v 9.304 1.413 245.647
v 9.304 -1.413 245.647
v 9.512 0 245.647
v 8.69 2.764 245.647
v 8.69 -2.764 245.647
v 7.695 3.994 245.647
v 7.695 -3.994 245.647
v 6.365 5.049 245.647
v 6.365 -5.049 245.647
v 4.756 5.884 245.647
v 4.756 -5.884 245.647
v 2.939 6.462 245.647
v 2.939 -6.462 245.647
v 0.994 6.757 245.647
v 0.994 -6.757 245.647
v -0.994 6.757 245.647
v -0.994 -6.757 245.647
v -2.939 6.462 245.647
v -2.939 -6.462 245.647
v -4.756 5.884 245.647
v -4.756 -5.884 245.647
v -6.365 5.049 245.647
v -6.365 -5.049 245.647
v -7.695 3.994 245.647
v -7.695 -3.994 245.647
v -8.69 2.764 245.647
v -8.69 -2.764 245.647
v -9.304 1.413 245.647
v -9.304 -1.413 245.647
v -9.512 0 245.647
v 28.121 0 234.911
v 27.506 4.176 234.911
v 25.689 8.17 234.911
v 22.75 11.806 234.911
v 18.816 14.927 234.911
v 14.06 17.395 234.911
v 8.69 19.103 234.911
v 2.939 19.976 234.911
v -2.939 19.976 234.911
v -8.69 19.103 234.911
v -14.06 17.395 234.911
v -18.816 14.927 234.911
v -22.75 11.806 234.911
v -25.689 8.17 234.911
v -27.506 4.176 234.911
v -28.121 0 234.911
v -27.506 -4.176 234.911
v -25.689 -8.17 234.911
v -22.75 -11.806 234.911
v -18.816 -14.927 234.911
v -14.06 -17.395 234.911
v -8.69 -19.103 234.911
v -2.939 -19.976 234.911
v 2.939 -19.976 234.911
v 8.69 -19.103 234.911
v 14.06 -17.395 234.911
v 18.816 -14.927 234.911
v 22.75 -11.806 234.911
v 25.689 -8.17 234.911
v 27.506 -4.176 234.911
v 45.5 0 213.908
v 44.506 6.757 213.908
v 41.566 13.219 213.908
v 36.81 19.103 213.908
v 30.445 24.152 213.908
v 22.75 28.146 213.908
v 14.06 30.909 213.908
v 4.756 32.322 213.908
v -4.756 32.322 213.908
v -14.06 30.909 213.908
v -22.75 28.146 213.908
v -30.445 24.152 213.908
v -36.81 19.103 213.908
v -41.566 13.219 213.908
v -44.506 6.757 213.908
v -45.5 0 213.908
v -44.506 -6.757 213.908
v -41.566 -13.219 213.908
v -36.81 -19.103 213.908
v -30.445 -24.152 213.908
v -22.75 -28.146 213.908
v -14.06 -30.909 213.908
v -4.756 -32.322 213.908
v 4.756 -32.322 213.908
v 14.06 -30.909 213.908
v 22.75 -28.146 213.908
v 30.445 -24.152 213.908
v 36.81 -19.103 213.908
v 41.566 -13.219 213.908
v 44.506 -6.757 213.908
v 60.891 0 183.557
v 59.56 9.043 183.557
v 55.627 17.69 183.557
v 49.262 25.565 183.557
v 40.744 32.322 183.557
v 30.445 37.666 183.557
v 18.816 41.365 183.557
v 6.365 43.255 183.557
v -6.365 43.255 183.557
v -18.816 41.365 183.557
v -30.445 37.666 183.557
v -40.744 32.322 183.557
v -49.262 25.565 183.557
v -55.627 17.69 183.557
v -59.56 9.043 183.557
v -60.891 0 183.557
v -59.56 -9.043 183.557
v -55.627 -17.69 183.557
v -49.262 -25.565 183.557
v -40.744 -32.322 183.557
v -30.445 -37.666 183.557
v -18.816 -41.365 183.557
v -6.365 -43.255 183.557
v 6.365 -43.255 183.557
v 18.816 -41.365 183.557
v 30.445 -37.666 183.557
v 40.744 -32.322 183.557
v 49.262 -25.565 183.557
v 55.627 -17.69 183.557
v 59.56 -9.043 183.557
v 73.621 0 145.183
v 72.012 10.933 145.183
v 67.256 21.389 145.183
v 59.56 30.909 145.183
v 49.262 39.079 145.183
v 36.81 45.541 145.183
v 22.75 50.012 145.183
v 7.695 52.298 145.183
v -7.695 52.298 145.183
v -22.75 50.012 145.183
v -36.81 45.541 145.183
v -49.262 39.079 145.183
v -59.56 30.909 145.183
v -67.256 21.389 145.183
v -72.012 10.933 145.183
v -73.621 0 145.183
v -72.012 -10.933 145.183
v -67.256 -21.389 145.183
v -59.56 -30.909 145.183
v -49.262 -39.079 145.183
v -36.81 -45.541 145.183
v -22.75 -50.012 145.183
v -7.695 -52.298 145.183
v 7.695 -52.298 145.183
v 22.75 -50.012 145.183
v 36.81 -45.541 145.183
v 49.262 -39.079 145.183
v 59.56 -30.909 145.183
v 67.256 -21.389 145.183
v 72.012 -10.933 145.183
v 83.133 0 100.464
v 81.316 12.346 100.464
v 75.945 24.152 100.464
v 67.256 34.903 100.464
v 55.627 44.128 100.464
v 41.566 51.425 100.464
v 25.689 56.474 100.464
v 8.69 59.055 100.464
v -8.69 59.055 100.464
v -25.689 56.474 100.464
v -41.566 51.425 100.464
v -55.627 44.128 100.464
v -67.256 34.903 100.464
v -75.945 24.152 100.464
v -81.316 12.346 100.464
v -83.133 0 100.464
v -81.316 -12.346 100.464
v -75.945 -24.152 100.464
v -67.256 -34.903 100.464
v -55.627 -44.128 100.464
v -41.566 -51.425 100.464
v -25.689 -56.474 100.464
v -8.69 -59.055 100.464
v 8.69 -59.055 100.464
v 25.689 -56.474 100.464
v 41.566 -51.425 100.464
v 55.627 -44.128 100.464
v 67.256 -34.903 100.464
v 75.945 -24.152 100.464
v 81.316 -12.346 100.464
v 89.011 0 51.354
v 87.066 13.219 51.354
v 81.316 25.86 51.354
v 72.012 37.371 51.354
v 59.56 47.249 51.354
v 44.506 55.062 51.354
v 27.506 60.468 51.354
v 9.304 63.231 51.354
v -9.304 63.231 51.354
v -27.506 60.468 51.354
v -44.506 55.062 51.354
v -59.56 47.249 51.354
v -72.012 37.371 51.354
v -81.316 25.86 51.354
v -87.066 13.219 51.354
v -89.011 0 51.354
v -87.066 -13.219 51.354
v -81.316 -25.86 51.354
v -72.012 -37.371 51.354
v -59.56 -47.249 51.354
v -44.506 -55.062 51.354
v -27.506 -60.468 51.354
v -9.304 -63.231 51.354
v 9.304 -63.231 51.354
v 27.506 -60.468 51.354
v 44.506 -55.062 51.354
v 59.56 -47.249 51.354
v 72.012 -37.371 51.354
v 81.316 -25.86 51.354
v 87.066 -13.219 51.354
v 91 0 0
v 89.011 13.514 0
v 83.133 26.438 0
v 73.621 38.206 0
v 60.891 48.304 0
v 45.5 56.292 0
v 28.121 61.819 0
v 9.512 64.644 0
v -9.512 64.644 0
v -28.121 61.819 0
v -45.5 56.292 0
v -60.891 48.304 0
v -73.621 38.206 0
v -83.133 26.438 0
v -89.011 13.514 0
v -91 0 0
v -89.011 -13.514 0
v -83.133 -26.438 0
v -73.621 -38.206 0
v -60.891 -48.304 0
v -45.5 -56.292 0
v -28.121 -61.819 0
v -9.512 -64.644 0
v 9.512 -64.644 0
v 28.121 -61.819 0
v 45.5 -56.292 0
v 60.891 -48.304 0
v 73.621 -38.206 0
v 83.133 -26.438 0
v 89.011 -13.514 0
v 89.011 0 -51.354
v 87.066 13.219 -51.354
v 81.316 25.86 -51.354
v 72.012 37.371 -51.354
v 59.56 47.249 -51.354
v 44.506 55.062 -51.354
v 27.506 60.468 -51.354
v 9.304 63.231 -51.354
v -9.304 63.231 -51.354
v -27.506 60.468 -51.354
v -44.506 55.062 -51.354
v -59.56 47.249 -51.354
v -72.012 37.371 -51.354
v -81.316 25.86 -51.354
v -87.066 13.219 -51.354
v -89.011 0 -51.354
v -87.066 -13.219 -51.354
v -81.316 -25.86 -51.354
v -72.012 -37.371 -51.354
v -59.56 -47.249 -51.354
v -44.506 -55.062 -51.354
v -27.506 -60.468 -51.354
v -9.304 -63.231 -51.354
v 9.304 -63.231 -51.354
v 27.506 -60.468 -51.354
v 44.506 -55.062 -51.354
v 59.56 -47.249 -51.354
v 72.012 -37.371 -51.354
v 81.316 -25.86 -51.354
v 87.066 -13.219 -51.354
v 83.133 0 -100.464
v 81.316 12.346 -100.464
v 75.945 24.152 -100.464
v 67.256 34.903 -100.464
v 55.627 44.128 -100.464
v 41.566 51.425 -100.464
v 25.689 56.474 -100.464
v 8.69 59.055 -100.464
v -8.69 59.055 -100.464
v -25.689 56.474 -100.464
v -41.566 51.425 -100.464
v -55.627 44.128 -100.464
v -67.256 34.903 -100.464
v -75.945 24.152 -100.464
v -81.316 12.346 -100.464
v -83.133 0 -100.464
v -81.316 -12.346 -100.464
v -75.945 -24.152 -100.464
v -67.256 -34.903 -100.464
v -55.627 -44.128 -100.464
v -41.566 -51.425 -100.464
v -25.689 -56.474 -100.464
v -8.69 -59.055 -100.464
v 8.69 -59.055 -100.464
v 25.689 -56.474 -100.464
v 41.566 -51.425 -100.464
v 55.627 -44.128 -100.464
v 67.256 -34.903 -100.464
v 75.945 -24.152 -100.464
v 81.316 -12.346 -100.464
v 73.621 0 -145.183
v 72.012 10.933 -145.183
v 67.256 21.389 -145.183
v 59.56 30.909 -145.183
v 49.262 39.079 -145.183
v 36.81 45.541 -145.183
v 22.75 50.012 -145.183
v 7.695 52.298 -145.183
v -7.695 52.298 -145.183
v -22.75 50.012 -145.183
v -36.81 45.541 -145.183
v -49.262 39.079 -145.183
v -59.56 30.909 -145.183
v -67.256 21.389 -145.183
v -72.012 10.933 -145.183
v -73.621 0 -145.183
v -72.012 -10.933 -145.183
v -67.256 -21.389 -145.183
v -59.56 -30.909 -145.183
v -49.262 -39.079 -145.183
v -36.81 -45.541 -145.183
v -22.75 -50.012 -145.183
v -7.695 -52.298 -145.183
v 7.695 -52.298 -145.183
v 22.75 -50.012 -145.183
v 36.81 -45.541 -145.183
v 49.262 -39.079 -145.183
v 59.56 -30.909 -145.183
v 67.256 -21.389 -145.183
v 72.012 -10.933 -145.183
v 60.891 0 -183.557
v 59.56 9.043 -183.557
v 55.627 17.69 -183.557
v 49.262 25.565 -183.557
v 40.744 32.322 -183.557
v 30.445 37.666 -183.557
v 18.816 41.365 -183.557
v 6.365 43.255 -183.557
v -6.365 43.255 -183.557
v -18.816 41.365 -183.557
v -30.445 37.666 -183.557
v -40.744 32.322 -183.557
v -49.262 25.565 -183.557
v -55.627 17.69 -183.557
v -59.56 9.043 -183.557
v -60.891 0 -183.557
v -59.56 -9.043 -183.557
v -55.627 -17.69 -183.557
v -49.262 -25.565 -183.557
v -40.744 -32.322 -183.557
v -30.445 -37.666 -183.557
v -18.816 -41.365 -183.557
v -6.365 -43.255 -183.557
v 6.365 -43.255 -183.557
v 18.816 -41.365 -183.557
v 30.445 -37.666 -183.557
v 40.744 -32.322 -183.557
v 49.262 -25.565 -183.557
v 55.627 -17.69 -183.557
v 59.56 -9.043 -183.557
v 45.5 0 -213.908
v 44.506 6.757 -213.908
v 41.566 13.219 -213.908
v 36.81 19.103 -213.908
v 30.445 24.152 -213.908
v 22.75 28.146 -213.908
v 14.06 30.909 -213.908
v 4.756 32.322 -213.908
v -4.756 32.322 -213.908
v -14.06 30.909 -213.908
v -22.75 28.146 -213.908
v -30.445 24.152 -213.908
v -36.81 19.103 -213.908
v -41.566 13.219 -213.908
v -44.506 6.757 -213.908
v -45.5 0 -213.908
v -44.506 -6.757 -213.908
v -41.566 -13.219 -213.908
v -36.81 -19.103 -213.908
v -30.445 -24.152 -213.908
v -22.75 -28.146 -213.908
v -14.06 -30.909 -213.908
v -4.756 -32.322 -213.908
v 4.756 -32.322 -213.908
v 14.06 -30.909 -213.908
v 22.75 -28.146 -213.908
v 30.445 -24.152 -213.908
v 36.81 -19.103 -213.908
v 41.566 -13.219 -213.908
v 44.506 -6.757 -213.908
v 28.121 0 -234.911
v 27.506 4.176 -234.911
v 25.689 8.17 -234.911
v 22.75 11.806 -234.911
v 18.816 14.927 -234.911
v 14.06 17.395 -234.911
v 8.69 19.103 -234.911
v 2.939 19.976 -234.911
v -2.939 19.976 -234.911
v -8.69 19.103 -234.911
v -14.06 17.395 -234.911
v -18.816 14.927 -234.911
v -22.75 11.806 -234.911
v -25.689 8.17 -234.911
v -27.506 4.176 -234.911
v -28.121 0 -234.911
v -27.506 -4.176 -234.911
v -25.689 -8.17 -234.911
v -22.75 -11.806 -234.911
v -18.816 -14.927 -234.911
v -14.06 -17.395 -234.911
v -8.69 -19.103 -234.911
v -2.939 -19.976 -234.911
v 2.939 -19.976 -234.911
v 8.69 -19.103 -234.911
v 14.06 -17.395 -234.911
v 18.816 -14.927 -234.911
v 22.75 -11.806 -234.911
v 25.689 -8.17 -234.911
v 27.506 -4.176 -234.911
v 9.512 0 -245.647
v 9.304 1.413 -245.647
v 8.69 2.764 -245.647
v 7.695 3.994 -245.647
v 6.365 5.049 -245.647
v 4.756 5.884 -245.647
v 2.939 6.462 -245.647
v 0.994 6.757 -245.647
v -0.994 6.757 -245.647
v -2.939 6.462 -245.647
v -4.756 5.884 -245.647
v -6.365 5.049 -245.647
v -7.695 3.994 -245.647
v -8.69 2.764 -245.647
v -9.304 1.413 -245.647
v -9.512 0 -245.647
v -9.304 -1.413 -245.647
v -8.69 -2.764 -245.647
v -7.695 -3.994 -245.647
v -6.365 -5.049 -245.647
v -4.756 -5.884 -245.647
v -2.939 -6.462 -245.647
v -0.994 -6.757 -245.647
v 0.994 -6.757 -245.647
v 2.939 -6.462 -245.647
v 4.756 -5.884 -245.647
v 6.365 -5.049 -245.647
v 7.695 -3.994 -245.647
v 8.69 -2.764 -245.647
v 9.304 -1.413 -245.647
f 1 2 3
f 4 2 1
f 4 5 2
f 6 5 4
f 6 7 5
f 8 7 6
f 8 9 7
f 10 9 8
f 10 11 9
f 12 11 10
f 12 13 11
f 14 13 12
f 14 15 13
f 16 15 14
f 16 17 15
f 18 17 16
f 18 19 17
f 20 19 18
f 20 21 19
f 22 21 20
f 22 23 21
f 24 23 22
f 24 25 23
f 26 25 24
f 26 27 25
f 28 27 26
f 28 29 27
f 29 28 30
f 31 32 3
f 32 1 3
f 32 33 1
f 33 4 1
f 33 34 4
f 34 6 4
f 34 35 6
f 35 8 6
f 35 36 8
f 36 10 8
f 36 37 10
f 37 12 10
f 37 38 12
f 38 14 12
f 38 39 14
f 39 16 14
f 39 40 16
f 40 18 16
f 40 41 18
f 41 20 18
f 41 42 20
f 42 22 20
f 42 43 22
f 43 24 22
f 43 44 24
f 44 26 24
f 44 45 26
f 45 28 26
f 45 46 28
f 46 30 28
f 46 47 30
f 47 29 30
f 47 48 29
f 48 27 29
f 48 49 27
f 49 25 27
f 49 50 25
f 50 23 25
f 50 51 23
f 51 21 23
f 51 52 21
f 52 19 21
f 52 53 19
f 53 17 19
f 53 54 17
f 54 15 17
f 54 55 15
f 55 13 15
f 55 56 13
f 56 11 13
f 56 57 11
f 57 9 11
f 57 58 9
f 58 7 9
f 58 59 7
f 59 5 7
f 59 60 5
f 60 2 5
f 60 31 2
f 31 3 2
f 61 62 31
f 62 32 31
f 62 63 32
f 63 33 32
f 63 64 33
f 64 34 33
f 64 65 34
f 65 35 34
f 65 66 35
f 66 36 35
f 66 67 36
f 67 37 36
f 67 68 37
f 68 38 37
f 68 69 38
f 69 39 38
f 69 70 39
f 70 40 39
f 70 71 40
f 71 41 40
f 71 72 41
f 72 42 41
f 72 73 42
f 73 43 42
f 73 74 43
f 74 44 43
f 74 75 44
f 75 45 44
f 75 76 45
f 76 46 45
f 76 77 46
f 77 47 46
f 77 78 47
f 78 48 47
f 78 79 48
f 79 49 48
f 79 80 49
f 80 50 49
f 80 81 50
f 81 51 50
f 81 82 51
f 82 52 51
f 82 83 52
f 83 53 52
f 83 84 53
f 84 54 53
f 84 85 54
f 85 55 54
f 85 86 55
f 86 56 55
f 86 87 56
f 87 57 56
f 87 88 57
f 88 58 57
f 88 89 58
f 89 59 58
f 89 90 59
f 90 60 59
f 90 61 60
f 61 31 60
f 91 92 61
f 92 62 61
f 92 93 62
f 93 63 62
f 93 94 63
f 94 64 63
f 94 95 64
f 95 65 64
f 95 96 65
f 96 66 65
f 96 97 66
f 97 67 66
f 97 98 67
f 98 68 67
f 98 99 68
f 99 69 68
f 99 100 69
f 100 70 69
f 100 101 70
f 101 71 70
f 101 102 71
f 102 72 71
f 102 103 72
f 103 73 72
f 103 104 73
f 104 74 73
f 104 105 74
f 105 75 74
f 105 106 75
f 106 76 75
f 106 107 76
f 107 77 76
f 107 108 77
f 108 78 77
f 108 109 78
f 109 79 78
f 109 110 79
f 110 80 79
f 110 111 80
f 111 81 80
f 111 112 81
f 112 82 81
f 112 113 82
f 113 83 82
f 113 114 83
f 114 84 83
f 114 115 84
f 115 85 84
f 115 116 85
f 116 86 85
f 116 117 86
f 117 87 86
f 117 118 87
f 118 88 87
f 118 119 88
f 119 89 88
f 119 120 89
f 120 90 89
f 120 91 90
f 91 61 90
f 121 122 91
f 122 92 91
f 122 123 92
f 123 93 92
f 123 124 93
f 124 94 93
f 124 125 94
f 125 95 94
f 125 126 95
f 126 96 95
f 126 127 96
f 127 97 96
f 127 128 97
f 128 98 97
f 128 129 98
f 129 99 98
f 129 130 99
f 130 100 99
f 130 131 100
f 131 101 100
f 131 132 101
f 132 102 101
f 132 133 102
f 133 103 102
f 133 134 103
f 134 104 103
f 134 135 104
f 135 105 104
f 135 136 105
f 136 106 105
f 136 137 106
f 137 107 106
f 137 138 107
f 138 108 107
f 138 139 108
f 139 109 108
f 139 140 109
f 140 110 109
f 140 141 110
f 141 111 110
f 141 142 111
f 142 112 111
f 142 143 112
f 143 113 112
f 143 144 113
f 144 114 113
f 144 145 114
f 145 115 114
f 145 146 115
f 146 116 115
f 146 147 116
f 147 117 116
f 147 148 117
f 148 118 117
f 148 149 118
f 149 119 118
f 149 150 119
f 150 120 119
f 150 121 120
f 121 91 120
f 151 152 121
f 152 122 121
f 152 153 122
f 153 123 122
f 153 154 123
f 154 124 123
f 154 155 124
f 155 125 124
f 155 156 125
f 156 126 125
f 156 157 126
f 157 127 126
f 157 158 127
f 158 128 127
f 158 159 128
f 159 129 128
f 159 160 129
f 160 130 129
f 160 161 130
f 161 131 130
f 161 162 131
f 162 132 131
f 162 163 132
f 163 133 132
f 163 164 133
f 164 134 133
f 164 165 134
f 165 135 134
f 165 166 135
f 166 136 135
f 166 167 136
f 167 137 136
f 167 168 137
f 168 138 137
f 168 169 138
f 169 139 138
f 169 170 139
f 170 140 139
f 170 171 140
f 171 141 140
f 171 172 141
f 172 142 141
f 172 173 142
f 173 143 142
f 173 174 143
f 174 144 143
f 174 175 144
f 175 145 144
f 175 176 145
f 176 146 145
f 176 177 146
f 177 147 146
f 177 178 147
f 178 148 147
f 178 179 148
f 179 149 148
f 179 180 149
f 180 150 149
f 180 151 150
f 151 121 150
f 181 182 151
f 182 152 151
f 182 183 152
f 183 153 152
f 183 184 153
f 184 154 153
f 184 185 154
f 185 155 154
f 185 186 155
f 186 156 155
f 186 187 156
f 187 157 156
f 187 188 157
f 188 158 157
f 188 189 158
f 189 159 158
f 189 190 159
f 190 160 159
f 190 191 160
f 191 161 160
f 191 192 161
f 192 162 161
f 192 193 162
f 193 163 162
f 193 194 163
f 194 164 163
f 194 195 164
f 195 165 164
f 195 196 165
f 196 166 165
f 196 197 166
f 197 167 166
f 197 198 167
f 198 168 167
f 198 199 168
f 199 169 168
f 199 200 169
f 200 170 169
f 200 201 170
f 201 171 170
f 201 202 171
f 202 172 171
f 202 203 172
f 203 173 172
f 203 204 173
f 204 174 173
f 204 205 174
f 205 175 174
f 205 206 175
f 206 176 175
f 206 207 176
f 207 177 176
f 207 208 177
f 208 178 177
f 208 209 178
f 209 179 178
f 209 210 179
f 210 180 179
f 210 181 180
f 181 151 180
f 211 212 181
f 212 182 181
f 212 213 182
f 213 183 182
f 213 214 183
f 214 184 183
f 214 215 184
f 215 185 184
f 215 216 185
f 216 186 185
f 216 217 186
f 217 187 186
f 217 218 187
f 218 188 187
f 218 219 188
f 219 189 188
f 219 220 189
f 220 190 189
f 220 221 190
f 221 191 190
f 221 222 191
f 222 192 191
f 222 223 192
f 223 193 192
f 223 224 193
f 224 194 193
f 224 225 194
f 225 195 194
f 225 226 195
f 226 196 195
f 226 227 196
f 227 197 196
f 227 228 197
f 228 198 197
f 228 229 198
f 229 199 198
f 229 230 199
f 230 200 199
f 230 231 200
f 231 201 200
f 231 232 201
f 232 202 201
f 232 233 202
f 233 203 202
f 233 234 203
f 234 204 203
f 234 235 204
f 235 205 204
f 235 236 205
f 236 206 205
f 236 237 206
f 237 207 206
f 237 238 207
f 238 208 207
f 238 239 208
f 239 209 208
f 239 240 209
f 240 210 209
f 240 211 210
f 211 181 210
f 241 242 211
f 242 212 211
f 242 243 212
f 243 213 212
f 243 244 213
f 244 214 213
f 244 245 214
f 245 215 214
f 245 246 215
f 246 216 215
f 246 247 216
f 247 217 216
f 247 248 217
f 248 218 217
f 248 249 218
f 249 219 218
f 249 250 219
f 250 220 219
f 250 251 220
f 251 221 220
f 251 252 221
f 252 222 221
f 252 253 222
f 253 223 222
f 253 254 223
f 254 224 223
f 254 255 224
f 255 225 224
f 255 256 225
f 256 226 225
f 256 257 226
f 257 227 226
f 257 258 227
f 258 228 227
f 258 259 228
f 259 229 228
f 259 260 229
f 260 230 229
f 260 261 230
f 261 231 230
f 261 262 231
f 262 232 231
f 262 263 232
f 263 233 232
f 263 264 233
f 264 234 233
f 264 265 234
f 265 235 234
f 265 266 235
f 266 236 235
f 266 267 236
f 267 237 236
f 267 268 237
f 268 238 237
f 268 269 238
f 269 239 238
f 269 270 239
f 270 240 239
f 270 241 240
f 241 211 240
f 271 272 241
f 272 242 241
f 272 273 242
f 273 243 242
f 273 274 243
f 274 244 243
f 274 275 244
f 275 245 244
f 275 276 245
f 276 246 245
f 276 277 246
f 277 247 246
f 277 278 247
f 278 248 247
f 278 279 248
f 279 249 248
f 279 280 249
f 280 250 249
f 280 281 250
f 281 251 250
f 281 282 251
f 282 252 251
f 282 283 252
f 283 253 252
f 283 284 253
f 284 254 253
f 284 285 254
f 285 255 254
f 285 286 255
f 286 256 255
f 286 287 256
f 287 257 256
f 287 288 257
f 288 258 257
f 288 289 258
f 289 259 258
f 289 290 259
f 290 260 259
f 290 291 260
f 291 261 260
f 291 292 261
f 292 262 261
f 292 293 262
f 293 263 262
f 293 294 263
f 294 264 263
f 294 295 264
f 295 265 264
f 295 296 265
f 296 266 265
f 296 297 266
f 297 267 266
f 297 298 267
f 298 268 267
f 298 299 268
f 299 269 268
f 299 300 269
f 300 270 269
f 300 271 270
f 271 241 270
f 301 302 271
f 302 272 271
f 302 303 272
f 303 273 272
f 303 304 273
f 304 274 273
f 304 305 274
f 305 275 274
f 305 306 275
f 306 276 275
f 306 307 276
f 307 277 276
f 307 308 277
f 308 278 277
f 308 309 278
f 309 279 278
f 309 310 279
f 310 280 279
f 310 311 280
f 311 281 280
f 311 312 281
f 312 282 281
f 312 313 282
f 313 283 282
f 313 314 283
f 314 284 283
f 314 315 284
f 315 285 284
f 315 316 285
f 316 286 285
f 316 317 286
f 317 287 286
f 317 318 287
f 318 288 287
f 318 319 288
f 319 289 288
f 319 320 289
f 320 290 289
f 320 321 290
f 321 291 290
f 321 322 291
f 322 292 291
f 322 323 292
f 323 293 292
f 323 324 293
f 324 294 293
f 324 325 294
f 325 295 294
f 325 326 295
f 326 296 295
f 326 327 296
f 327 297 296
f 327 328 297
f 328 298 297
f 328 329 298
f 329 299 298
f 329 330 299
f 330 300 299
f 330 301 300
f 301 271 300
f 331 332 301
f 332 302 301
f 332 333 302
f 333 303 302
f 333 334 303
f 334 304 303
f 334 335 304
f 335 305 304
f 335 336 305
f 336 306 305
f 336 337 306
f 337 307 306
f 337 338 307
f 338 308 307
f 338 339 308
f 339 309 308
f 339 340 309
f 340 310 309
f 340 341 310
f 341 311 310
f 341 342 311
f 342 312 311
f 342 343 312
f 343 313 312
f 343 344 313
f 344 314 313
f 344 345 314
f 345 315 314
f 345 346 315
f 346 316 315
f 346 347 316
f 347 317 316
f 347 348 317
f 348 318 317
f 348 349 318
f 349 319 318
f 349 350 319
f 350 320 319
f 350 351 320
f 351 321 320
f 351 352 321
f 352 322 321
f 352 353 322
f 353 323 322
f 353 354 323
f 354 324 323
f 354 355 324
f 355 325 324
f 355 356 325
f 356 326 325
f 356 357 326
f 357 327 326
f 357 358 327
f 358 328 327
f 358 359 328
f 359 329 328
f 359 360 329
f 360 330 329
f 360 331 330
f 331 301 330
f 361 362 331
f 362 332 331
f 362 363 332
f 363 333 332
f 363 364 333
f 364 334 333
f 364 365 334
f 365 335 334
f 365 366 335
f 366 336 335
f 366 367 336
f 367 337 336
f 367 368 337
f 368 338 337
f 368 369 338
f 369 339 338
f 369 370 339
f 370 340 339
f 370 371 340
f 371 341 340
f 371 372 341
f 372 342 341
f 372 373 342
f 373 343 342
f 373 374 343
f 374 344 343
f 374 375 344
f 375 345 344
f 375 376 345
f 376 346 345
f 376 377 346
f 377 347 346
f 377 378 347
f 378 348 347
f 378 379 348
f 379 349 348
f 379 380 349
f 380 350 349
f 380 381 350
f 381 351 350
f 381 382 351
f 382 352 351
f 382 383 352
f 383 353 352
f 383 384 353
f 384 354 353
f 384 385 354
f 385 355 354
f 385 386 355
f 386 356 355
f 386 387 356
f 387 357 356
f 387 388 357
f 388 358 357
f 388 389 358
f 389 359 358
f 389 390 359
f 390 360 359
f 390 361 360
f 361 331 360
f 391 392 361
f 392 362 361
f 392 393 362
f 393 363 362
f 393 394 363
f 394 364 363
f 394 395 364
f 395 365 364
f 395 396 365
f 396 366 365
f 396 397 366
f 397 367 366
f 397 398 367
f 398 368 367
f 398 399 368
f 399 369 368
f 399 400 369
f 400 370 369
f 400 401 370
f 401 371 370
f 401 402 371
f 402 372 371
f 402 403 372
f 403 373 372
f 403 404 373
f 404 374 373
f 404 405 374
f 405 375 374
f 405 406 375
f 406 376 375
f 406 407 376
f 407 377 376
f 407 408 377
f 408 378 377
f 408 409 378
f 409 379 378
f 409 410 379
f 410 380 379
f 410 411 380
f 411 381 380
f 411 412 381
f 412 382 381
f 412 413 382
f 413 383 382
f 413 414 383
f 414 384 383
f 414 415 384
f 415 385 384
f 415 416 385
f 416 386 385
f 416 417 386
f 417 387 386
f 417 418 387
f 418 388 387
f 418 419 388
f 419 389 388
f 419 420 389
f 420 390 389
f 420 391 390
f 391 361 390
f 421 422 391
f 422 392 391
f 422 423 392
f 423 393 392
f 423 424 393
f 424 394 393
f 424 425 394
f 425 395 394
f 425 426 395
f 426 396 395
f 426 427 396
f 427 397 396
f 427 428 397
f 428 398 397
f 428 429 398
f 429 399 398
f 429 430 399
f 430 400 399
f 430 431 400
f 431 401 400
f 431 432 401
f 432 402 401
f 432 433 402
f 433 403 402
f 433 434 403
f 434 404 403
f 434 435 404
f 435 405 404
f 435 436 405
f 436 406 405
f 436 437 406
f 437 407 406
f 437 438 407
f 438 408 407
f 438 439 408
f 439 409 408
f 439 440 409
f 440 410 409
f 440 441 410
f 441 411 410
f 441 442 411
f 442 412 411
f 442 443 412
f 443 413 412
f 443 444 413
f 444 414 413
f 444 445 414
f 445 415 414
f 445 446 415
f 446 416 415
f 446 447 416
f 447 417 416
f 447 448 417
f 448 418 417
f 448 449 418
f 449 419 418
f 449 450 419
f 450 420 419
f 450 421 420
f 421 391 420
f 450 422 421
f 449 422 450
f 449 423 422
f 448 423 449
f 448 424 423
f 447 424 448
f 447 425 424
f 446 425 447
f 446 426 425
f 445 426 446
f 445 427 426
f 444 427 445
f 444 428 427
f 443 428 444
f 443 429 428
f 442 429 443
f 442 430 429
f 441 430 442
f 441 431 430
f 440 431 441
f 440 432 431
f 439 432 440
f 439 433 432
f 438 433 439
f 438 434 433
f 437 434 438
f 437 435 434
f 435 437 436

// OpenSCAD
// Generated by SolidPython 1.0.1 on 2020-07-29 00:46:47


scale(v = [7, 5, 19]) {
	sphere(r = 13);
}
/***********************************************
*********      SolidPython code:      **********
************************************************
 
# import packages: SolidPython
from solid import *
from solid.utils import *
from itertools import chain, combinations, permutations


class Resize:

    def __init__(self, scad_file):
        self.scad_file = scad_file
        #self.scad_file = import_scad(scad_file)
        # cone/cylinder param:
        self.r1 = 0
        self.r2 = 0
        self.h = 0
        # rectangular prism param:
        self.w = 0
        self.l = 0
        # ellipse param:
        self.r = 0

    # import OpenScad code (file name corresponds to shape)


    # classify shape + parameters
    def assign(self, param1, param2, param3):
        if self.scad_file == 'cone.scad':
            self.r1 = param1
            self.r2 = param2
            self.h = param3
        elif self.scad_file == 'cylinder.scad':
            self.r1 = param1
            self.r2 = param2
            self.h = param3
        elif self.scad_file == 'rectangularPrism.scad':
            self.h = param1
            self.l = param2
            self.w = param3
        else:
            self.r = param1
            self.h = param2

    # resize parameters
    def iterate(self):
        x = range(3, 20, 2)
        i = 1
        if self.scad_file == 'cone.scad':
            tempList = list(permutations(x, 2))
            for temp in tempList:
                param1 = temp[0]
                param2 = temp[1]
                filepath = 'produced_scad_files/' + 'cone' + str(param1) + '_' + str(param2) + '_' + '.scad'
                scad_render_to_file(cylinder(h=param1, r1=param2, r2=0), filepath)

        elif self.scad_file == 'cylinder.scad':
            tempList = list(permutations(x, 3))
            for temp in tempList:
                param1 = temp[0]
                param2 = temp[1]
                filepath = 'produced_scad_files/' + 'cylinder' + str(param1) + '_' + str(param2) + '_' + '.scad'
                scad_render_to_file(cylinder(h=param1, r1=param2, r2=param2), filepath)

        elif self.scad_file == 'rectangularPrism.scad':
            tempList = list(permutations(x, 3))
            for temp in tempList:
                param1 = temp[0]
                param2 = temp[1]
                param3 = temp[2]
                filepath = 'produced_scad_files/' + 'rectangularPrism' + str(param1) + '_' + str(param2) + '_' + str(
                    param3) + '.scad'
                scad_render_to_file(cube(size=(param1, param2, param3)), filepath)

        elif self.scad_file == 'ellipse.scad':
            tempList = list(permutations(x, 4))
            for temp in tempList:
                param1 = temp[0]
                param2 = temp[1]
                param3 = temp[2]
                param4 = temp[3]
                filepath = 'produced_scad_files/' + 'ellipse' + str(param1) + '_' + str(param2) + '_' + str(param3) + '_' + str(param4) + '.scad'
                scad_render_to_file(scale([param1, param2, param3])(sphere(r=param4)), filepath)

    def render_to_scadfile(self):
        scad_render_to_file(scad, 'example.scad') 
 
************************************************/
